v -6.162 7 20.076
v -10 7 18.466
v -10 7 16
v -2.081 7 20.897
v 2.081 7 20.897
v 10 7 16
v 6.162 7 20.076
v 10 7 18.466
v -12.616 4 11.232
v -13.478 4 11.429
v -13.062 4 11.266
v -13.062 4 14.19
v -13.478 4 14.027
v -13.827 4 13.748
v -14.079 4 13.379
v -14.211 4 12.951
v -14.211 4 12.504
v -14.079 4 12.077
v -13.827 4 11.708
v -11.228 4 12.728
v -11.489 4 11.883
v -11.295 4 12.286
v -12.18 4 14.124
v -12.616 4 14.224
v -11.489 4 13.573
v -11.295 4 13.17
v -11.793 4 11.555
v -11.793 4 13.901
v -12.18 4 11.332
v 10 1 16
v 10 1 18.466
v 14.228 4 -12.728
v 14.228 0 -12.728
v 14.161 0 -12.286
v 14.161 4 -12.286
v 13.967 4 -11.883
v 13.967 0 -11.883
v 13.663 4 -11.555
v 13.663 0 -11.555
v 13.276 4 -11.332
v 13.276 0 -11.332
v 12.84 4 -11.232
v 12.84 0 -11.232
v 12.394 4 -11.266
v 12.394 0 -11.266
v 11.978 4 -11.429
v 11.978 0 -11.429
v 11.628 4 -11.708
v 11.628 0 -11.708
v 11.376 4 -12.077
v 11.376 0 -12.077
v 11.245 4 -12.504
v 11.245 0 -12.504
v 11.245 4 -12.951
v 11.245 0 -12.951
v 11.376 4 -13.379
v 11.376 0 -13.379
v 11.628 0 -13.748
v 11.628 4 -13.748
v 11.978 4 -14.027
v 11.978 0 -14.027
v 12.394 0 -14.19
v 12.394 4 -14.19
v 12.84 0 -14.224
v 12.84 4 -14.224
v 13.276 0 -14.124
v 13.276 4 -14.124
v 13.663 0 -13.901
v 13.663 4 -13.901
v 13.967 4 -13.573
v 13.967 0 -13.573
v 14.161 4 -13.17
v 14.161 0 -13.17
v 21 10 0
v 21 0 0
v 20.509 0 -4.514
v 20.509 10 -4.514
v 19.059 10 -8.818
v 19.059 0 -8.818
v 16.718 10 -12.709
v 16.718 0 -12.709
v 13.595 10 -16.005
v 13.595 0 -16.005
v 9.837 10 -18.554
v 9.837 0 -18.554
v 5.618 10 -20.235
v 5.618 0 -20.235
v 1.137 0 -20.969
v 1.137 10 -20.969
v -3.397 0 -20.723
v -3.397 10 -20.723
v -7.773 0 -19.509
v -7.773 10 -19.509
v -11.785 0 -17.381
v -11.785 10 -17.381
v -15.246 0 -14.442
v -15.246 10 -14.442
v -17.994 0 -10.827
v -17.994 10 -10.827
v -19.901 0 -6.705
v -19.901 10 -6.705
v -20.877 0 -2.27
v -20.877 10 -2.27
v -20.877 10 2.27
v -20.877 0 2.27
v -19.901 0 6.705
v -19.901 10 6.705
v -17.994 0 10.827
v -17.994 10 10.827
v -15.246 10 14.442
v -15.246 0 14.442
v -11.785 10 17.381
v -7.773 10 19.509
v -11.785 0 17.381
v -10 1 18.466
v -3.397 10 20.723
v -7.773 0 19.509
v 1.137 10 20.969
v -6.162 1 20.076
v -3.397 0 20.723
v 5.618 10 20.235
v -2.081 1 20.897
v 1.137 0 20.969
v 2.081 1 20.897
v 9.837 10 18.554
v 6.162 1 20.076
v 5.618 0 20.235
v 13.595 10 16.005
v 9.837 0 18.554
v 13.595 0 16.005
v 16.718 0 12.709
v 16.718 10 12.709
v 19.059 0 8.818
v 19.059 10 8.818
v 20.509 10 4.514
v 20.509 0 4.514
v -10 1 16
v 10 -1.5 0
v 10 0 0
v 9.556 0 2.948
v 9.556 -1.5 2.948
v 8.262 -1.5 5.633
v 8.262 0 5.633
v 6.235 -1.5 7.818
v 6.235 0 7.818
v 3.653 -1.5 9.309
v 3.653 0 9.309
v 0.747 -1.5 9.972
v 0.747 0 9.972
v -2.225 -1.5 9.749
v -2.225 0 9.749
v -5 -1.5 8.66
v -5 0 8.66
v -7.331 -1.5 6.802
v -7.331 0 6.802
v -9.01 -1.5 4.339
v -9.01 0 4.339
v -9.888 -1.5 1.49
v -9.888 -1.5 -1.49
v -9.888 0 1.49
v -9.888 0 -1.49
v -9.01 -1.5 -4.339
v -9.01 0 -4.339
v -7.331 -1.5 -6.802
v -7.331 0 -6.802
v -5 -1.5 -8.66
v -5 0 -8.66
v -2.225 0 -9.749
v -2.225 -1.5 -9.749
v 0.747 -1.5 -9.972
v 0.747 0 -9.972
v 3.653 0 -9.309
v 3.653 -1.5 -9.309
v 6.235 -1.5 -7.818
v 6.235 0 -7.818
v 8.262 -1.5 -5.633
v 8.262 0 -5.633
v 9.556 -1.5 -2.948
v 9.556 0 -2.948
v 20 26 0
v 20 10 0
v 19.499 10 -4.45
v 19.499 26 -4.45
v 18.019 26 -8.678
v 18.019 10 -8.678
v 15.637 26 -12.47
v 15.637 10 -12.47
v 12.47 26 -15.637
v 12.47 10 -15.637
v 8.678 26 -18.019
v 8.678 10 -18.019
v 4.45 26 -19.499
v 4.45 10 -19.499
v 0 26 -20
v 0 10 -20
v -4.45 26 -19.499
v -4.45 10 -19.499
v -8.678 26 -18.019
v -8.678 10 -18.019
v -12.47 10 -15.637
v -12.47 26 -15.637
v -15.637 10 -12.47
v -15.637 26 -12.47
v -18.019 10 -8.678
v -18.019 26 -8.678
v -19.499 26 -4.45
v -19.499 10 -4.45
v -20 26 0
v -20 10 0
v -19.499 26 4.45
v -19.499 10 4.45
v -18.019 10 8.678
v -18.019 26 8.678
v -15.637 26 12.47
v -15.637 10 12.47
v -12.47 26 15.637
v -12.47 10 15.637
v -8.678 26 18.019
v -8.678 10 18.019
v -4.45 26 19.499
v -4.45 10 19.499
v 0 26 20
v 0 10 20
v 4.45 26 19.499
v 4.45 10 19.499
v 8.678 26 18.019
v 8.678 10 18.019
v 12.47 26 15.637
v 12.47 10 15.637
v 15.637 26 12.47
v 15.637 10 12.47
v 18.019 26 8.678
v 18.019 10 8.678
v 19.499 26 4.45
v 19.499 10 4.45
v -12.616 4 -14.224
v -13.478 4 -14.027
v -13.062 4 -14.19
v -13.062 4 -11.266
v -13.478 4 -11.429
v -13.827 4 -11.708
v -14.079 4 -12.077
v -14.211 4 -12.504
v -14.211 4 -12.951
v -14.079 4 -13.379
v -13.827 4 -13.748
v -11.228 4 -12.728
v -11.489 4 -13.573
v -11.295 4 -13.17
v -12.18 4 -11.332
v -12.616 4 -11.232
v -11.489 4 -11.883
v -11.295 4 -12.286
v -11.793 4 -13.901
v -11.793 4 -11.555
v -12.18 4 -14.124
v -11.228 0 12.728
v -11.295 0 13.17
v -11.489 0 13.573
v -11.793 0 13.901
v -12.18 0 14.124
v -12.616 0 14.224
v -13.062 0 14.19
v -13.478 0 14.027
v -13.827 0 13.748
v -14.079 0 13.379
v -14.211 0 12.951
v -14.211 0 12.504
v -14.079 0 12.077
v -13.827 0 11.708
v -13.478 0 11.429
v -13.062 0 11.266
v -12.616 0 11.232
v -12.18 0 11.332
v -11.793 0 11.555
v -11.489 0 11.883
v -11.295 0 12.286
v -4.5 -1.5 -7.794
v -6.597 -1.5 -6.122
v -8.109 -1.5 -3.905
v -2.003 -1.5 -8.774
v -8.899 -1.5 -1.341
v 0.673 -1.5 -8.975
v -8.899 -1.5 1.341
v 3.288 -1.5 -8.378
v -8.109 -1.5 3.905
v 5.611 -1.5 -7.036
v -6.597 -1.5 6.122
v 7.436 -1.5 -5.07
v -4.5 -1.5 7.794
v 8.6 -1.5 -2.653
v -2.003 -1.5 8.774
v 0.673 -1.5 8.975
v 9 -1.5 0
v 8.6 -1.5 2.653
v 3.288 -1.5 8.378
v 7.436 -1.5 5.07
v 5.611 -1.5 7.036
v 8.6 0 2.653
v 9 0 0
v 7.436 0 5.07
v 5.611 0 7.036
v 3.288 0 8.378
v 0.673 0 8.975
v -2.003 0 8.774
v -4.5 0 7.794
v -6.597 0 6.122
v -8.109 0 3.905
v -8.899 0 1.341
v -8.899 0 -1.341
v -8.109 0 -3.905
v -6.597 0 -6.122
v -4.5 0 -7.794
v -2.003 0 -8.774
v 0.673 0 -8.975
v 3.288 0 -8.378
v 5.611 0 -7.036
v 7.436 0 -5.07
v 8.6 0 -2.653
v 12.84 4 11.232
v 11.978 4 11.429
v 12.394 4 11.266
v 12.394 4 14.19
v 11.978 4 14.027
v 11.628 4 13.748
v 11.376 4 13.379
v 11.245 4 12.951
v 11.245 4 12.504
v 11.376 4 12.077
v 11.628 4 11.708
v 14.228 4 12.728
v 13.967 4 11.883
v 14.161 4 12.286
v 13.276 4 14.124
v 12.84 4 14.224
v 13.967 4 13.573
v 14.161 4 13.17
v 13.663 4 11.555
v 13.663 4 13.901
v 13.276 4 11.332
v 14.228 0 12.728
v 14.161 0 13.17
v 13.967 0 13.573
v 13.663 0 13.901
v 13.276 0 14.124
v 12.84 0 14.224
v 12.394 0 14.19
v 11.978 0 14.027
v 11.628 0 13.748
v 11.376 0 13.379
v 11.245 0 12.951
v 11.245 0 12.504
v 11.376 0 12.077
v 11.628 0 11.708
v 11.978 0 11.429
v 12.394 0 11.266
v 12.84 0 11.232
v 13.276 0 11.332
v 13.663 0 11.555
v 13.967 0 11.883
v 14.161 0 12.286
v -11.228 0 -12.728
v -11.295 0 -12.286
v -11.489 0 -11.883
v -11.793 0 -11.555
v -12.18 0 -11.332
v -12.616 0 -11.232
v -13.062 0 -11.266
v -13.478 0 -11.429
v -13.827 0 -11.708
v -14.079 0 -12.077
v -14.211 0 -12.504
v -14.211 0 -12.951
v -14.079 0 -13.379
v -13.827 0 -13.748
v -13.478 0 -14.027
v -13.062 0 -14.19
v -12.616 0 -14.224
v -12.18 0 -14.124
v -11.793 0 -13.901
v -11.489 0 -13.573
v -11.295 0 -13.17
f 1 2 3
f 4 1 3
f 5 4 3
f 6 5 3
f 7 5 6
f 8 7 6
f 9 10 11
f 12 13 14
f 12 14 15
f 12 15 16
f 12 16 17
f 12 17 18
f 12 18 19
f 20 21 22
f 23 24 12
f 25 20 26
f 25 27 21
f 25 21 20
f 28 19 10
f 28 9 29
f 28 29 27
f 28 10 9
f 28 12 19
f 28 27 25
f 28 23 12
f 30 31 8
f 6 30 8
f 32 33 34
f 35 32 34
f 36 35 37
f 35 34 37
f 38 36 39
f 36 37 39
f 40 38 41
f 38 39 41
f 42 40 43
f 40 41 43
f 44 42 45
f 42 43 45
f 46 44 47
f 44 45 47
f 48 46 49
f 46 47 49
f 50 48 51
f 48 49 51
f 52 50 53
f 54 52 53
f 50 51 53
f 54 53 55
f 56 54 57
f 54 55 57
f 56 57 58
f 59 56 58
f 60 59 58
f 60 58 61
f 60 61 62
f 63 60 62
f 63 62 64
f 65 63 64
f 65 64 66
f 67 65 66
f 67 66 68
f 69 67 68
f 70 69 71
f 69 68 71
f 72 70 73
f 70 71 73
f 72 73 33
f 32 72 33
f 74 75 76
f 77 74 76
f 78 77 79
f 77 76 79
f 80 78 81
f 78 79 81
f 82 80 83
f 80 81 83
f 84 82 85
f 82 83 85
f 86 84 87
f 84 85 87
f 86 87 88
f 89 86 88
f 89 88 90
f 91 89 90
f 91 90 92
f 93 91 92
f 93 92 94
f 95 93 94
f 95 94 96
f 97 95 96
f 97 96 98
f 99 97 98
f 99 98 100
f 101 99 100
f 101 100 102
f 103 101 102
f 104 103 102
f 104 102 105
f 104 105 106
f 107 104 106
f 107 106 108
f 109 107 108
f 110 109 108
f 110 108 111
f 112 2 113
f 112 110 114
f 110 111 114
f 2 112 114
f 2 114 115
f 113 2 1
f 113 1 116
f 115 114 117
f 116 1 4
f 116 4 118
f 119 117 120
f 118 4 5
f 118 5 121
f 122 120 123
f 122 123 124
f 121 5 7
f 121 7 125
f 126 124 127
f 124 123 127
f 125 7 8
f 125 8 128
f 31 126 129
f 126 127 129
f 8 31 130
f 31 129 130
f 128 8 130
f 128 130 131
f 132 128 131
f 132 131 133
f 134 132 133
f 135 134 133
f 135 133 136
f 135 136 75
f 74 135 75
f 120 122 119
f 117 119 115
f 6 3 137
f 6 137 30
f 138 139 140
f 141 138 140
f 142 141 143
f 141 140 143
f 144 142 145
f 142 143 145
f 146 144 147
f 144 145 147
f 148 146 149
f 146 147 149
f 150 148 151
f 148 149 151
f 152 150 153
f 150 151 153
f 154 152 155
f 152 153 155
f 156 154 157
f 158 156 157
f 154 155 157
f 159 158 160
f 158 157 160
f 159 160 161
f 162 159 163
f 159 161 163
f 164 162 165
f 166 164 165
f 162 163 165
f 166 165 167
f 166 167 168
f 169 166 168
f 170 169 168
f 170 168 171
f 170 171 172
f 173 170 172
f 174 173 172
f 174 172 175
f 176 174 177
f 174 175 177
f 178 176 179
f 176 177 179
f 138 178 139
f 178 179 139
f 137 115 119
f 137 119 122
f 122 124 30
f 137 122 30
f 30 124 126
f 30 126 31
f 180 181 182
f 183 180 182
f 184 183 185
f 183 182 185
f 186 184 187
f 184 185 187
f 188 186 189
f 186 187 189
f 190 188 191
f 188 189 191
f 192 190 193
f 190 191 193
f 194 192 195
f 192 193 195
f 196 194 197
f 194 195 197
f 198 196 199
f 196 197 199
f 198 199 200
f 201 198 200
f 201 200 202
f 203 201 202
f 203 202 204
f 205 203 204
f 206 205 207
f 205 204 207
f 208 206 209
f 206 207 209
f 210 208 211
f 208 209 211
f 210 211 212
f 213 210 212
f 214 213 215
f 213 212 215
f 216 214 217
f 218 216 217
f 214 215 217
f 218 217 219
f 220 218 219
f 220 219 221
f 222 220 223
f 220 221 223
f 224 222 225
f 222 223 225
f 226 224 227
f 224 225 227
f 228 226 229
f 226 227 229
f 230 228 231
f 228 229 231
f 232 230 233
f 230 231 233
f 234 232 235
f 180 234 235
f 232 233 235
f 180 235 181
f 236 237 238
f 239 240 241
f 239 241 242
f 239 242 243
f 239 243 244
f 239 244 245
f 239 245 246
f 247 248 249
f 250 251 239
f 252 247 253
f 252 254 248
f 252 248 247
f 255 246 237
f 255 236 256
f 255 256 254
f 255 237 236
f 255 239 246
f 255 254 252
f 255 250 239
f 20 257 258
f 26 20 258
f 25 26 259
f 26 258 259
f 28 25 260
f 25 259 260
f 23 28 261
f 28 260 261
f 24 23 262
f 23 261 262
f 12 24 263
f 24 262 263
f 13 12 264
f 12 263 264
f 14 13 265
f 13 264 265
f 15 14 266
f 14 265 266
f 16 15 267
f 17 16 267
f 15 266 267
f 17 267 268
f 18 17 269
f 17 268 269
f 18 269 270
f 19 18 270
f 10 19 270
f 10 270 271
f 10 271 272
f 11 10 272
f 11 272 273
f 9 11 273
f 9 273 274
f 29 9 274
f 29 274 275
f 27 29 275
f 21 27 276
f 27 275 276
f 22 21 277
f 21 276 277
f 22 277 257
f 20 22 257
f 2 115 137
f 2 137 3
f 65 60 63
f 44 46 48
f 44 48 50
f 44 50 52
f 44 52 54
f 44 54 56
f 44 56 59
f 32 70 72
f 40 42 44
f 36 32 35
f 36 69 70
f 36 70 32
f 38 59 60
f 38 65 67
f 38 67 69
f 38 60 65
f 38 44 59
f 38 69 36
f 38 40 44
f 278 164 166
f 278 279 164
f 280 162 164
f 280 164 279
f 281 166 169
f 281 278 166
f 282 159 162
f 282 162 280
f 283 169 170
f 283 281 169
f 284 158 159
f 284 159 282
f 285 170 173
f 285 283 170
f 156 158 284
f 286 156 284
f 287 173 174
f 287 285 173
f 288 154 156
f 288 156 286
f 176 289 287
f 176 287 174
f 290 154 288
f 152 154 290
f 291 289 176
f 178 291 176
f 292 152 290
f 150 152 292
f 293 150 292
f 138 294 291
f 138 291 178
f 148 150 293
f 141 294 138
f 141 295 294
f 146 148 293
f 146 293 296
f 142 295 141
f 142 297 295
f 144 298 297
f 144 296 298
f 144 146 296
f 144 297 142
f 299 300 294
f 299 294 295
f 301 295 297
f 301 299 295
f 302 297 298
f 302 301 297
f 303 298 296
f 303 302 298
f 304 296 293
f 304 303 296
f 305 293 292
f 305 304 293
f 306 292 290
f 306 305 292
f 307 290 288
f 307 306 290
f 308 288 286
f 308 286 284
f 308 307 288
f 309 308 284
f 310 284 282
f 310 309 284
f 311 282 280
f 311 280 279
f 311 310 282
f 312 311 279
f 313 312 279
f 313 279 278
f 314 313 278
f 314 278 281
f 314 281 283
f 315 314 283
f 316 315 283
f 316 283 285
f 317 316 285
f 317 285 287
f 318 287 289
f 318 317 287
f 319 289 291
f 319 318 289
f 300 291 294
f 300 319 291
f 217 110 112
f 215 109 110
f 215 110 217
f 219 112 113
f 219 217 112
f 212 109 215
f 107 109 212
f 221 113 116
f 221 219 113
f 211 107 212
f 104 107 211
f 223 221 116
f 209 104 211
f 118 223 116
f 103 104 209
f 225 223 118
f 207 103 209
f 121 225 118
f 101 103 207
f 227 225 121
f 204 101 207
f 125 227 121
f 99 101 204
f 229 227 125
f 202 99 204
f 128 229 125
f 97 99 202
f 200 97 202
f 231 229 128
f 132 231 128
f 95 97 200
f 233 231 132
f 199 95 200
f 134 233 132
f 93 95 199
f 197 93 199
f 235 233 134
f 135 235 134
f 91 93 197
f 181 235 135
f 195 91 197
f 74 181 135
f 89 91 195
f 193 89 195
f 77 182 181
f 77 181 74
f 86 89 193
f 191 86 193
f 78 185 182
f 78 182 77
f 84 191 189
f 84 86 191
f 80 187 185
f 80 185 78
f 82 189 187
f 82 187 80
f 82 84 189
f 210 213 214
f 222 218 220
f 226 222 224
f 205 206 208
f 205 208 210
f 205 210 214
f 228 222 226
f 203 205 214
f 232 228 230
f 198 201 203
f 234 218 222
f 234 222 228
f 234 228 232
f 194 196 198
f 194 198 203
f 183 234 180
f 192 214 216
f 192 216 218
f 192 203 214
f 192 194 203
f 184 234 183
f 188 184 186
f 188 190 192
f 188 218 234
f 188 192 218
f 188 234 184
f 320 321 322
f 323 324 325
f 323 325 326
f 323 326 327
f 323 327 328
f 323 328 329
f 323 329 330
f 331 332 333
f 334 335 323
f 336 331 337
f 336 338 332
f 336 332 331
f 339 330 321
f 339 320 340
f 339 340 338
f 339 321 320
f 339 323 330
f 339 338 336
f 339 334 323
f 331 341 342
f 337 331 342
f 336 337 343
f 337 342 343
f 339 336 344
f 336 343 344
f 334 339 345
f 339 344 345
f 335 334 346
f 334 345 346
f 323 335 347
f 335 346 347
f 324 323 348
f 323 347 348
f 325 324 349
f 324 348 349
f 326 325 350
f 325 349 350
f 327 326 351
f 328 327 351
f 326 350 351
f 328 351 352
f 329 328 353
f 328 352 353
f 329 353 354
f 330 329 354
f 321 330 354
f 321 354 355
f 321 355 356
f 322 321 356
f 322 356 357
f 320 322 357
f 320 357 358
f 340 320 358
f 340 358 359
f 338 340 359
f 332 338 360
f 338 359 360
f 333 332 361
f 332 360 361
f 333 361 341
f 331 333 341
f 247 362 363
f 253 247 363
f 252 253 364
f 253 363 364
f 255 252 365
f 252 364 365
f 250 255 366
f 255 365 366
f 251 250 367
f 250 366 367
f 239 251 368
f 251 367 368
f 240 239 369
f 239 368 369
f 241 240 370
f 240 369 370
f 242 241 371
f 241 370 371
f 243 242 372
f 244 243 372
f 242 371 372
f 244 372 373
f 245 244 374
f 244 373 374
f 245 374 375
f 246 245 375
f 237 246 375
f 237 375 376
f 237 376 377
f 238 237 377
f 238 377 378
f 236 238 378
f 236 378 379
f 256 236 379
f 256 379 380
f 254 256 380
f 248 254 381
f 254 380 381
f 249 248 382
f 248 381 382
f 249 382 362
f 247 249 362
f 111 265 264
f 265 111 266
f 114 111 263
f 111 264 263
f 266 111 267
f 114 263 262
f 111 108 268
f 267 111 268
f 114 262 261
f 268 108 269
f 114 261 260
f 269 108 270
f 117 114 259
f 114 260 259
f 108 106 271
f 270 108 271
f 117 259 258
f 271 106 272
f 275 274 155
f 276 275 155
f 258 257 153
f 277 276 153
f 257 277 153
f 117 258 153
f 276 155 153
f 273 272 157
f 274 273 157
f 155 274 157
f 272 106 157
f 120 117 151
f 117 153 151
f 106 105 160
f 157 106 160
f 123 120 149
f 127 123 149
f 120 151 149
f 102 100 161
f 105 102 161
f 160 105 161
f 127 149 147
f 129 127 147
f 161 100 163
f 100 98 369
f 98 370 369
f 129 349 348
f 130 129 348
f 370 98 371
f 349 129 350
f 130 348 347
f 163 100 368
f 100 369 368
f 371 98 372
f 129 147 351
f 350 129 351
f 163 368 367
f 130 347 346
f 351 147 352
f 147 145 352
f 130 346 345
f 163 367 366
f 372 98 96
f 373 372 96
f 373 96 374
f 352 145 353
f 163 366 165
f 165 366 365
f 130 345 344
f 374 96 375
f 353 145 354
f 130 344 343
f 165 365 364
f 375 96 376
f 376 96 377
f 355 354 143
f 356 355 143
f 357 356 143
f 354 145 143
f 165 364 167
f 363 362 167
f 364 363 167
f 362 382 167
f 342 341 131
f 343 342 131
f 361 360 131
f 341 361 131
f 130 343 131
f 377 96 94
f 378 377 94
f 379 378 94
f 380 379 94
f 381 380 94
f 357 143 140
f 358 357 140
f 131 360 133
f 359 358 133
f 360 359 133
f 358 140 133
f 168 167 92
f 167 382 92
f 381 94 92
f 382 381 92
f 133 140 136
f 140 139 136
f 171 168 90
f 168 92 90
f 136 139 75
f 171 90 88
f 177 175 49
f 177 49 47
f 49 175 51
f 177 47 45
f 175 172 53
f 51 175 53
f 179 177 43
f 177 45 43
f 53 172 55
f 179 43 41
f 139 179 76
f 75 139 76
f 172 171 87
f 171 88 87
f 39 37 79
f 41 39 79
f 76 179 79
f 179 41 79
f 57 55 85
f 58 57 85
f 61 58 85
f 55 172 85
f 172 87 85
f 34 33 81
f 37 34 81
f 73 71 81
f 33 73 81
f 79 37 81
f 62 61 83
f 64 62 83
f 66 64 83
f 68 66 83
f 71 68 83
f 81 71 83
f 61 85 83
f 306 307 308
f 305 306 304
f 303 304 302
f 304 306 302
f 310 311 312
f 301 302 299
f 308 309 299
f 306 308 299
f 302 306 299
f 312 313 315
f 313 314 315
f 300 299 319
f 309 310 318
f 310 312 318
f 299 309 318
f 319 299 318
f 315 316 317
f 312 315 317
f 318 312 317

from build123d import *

# Parameters (mm, degrees)
SKETCH_1_R          = 21
EXTRUDE_1_DEPTH     = 10
SKETCH_4_R          = 20
EXTRUDE_3_DEPTH     = 16
SKETCH_6_R          = 1.5
CUT_EXTRUDE_1_DEPTH = 4
SKETCH_7_R          = 10
SKETCH_7_R_2        = 9
EXTRUDE_4_DEPTH     = 1.5
SKETCH_8_W          = 20
SKETCH_8_H          = 6
CUT_EXTRUDE_2_DEPTH = 5


with BuildPart() as part:
    # 草图1 → 凸台-拉伸1 (new body)
    with BuildSketch(Plane(origin=(0, 0, 0), x_dir=(1, 0, 0), z_dir=(0, 1, 0))):
        Circle(SKETCH_1_R)
    extrude(amount=EXTRUDE_1_DEPTH)

    # 草图4 → 凸台-拉伸3 (add)
    with BuildSketch(Plane(origin=(0, 10, 0), x_dir=(1, 0, 0), z_dir=(0, 1, 0))):
        Circle(SKETCH_4_R)
    extrude(amount=EXTRUDE_3_DEPTH)

    # 草图6 → 切除-拉伸1 (cut)
    with BuildSketch(Plane.XZ):
        with Locations((12.727922061, 12.727922061)):
            Circle(SKETCH_6_R)
        with Locations((12.727922061, -12.727922061)):
            Circle(SKETCH_6_R)
        with Locations((-12.727922061, -12.727922061)):
            Circle(SKETCH_6_R)
        with Locations((-12.727922061, 12.727922061)):
            Circle(SKETCH_6_R)
    extrude(amount=-CUT_EXTRUDE_1_DEPTH, mode=Mode.SUBTRACT)

    # 草图7 → 凸台-拉伸4 (add)
    with BuildSketch(Plane.XZ):
        Circle(SKETCH_7_R)
        Circle(SKETCH_7_R_2, mode=Mode.SUBTRACT)
    extrude(amount=EXTRUDE_4_DEPTH)

    # 草图8 → 切除-拉伸2 (cut)
    with BuildSketch(Plane.XY.offset(21)):
        with Locations((0, 4)):
            Rectangle(SKETCH_8_W, SKETCH_8_H)
    extrude(amount=-CUT_EXTRUDE_2_DEPTH, mode=Mode.SUBTRACT)


solid = part.part
